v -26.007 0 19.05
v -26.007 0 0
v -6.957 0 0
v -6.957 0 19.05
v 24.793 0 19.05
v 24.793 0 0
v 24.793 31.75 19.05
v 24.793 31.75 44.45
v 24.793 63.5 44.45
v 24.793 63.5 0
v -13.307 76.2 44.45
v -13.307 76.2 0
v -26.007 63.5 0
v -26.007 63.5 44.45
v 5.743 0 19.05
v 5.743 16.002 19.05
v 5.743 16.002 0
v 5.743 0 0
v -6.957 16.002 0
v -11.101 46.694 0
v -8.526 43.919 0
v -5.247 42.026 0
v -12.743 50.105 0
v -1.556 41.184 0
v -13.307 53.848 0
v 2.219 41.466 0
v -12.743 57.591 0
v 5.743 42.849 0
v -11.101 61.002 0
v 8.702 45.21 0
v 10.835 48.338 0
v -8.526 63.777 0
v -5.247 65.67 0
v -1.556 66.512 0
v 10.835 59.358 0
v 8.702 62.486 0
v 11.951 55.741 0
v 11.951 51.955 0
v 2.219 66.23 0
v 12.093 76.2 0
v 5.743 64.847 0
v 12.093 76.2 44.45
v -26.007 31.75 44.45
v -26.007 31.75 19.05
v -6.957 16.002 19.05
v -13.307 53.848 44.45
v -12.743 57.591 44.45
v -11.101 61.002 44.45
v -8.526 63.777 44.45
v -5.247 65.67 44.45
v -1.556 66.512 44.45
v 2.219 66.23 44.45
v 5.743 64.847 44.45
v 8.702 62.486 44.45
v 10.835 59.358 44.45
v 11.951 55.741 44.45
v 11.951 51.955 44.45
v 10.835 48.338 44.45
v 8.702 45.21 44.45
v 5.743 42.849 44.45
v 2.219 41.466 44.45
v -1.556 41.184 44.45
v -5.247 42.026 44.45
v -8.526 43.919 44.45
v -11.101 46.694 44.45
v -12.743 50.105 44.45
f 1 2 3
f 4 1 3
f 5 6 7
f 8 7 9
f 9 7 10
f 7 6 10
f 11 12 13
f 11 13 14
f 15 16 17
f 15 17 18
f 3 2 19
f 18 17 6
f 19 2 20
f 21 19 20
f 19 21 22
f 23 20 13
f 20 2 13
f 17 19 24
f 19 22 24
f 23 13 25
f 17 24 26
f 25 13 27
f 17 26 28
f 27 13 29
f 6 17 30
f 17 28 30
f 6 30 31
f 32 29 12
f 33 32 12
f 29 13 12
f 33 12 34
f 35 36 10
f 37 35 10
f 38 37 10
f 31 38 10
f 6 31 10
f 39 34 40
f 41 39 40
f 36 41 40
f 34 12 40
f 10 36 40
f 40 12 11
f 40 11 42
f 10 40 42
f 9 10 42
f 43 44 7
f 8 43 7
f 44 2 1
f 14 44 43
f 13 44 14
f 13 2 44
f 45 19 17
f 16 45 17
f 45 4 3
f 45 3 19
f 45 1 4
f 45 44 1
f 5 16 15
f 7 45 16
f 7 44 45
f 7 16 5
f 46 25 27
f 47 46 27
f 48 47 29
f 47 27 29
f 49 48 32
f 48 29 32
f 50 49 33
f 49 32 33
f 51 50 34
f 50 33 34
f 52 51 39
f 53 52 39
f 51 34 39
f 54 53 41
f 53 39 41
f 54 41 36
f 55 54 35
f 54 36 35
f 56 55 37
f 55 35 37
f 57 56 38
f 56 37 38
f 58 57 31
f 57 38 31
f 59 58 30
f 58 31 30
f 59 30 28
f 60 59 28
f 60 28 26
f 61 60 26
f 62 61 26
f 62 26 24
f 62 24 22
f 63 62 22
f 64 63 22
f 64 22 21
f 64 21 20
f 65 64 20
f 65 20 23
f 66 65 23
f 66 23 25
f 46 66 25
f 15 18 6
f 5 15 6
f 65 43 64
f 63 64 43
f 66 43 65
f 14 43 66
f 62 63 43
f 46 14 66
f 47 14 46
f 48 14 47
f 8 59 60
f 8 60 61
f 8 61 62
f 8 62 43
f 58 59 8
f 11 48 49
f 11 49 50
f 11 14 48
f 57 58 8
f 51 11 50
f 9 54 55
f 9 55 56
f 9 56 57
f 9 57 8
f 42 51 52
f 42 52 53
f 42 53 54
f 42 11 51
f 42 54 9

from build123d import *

# Parameters (mm, degrees)
F1_DEPTH = 19.05
F0_W     = 50.8
F0_H     = 44.45
F2_DEPTH = 44.45
F3_SIZE  = 12.7
F5_D     = 25.4


with BuildPart() as f1:
    # F0 (on Top) → F1 (new body)
    with BuildSketch(Plane.XY):
        Polygon((-26.007392, 0), (-6.957392, 0), (-6.957392, 16.002), (5.742608, 16.002), (5.742608, 0), (24.792608, 0), (24.792608, 31.75), (-26.007392, 31.75), align=None)
    extrude(amount=F1_DEPTH)

    # F0 (on Top) → F2 (join)
    with BuildSketch(Plane.XY):
        with Locations((-0.607392, 53.975)):
            Rectangle(F0_W, F0_H)
    extrude(amount=F2_DEPTH)

    # F3
    f3_edges = [f1.edges().sort_by_distance(p)[0] for p in [
        (24.792608, 76.2, 22.225),
        (-26.007392, 76.2, 22.225),
    ]]
    chamfer(f3_edges, length=F3_SIZE)

    # F5 (through all)
    with Locations(Plane.XY.offset(44.45)):
        with Locations((-0.607392, 53.848)):
            Hole(F5_D / 2)


solid = f1.part
